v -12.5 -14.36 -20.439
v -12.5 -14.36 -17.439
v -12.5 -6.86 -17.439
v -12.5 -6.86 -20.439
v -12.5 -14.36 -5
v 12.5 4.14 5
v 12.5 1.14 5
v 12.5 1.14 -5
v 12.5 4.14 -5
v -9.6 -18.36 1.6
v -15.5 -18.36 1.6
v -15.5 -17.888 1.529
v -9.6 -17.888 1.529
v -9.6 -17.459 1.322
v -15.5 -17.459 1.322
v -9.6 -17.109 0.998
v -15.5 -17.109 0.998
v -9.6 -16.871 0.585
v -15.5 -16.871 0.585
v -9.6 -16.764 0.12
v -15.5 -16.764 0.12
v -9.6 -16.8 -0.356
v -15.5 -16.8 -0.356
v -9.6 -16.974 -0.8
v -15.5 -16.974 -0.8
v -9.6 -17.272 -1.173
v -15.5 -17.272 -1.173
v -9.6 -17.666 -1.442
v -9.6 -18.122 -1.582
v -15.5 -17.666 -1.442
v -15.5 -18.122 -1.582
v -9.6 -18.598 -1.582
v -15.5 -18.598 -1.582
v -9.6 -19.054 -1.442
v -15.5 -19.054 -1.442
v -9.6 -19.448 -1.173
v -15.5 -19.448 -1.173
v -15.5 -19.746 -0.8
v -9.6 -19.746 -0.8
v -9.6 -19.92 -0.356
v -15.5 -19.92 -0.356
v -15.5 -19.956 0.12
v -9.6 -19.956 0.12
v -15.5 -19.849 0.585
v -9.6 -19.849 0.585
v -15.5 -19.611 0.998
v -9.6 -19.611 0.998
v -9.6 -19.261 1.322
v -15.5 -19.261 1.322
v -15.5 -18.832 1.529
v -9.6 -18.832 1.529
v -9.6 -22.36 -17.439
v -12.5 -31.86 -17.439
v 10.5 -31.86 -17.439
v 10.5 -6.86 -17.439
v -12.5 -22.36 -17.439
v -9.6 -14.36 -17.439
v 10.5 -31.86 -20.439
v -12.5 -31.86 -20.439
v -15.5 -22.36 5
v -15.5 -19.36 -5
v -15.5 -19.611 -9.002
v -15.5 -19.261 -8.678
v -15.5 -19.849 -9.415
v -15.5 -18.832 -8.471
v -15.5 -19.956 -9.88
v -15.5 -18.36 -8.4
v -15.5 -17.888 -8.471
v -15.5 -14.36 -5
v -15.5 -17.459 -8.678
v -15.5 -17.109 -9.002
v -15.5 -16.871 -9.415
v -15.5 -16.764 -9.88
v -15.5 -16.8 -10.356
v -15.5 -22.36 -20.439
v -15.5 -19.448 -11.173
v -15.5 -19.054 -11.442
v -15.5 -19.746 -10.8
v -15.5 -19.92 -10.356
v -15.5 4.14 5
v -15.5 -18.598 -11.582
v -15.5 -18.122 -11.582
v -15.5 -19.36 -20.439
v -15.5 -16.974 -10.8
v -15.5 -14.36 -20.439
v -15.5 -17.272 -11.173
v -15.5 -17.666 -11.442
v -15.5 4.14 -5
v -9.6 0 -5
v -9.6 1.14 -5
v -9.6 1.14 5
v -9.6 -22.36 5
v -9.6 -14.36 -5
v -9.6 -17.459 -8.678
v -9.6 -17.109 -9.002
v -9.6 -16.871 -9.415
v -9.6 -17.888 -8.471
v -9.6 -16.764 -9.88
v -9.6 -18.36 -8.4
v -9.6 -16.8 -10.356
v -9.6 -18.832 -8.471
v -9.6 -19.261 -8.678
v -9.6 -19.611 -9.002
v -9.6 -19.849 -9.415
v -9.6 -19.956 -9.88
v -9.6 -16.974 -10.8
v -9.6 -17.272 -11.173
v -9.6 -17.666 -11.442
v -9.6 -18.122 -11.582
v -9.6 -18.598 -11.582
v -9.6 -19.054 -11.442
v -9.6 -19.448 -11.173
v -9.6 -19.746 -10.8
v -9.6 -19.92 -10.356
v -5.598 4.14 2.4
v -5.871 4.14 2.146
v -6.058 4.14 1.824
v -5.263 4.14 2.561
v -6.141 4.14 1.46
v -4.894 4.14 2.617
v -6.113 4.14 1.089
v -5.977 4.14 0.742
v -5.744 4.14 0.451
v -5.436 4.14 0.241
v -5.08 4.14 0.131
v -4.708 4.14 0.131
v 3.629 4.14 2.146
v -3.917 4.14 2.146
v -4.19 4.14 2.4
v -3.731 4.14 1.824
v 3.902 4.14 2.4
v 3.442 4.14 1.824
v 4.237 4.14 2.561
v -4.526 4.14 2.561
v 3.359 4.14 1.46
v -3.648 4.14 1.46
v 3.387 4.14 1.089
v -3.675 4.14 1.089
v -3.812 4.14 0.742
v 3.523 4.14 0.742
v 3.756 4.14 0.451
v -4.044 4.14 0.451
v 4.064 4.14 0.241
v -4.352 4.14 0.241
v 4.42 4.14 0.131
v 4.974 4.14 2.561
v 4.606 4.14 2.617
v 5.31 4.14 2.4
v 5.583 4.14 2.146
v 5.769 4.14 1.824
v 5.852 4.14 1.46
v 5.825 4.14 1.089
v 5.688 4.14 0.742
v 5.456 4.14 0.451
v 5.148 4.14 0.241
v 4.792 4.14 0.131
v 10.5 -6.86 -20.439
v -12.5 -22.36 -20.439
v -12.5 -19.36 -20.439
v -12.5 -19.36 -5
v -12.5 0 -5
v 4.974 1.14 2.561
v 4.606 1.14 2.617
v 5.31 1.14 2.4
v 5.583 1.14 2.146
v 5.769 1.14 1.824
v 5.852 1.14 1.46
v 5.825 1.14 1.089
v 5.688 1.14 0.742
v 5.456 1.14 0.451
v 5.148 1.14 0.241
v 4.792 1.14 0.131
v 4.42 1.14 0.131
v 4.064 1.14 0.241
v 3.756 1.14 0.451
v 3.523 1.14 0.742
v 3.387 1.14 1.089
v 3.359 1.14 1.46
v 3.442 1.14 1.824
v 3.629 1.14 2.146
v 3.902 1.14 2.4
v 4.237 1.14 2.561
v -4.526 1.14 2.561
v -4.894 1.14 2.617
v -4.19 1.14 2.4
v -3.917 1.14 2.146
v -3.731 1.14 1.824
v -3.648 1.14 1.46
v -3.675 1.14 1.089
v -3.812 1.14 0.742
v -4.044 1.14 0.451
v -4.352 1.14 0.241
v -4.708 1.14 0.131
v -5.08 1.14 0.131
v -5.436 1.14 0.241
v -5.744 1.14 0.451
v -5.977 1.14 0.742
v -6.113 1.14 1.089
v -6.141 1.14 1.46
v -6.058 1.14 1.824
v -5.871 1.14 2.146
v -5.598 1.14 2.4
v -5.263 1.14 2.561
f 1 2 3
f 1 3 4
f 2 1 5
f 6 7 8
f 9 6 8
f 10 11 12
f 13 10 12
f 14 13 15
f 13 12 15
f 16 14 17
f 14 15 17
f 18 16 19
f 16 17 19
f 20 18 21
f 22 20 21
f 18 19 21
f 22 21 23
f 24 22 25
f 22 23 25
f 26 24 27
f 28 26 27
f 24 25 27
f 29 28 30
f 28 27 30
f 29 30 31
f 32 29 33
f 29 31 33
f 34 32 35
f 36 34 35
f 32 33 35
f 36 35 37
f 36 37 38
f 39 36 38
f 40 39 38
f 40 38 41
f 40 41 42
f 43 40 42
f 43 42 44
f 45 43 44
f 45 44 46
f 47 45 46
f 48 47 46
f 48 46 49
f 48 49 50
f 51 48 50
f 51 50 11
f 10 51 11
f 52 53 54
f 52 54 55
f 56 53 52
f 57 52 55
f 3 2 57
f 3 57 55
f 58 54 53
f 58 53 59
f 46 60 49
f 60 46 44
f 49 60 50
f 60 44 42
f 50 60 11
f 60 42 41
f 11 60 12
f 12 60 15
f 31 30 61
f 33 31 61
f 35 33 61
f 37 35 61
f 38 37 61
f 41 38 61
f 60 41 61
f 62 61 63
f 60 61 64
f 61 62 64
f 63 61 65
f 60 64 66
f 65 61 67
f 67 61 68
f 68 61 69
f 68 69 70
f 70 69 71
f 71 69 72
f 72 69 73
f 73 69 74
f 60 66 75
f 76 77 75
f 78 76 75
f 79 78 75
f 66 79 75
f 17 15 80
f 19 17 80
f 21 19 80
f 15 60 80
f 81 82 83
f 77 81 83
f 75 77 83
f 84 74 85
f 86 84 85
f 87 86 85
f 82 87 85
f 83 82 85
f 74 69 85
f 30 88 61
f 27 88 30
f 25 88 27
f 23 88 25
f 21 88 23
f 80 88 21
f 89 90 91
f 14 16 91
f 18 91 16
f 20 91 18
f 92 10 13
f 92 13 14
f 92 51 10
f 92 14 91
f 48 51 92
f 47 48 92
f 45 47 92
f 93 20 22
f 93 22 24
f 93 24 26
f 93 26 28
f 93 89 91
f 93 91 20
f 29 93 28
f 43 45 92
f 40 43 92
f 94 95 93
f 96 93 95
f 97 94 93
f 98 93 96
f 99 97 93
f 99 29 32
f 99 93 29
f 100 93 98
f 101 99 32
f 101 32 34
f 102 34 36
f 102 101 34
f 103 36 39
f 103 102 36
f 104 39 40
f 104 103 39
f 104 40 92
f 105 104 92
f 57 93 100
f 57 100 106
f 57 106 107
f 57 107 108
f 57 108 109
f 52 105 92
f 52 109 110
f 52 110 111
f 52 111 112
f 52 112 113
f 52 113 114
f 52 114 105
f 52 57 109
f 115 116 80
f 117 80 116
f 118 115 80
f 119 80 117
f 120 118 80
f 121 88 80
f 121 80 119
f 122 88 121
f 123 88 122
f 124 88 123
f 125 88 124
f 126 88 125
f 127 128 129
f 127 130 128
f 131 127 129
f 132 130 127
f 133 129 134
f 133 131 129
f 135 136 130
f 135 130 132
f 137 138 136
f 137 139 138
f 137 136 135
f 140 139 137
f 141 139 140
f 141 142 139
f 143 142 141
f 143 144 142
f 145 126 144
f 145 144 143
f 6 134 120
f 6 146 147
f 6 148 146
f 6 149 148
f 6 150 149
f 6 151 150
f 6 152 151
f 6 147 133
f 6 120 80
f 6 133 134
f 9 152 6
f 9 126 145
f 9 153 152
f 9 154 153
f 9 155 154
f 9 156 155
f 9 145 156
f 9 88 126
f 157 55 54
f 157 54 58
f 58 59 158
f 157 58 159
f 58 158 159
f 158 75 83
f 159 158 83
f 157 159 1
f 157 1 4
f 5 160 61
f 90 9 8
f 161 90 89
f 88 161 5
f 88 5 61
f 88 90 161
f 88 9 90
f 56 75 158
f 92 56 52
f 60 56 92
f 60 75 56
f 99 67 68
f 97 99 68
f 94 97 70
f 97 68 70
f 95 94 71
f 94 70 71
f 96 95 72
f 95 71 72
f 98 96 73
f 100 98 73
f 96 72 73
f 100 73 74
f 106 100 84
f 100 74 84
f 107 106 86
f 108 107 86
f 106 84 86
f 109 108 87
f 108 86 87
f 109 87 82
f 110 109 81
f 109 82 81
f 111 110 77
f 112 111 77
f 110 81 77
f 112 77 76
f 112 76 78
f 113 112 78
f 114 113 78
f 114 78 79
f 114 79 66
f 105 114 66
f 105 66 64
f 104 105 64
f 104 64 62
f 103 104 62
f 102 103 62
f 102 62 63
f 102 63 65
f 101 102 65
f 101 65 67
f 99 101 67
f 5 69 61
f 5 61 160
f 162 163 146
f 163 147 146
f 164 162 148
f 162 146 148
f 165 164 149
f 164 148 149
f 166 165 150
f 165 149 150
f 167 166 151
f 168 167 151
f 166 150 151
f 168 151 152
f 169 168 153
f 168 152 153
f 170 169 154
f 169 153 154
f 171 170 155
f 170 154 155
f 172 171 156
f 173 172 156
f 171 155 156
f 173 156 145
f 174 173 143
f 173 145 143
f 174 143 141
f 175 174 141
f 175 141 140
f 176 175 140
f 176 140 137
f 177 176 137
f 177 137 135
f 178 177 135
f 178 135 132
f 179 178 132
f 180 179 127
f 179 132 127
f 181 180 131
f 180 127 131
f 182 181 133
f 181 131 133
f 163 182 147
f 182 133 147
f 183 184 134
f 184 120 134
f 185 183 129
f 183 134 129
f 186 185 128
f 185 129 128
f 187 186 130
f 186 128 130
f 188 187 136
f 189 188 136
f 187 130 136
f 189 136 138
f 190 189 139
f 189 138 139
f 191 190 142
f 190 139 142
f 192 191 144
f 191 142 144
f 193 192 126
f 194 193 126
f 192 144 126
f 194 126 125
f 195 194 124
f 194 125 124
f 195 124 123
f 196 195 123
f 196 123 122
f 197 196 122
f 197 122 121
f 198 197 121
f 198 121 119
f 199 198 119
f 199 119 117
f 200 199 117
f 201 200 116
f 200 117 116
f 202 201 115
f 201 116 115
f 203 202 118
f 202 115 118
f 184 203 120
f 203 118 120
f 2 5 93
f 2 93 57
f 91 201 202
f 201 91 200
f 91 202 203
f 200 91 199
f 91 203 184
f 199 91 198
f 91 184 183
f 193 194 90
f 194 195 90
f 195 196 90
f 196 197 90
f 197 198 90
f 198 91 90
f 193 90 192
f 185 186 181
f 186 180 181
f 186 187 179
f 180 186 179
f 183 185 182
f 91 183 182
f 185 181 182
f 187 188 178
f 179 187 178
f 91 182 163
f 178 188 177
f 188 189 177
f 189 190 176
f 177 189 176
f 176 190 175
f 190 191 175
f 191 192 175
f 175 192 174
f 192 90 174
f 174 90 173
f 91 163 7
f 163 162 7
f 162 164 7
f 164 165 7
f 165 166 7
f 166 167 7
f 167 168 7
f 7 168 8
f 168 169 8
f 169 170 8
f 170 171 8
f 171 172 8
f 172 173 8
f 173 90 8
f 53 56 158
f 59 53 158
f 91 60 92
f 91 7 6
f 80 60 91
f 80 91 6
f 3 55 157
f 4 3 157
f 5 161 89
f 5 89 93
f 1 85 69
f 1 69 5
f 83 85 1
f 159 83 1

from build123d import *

# Parameters (mm, degrees)
SKETCH1_W               = 25
SKETCH1_H               = 10
BOSS_EXTRUDE1_DEPTH     = 3
SKETCH2_R               = 1.25
CUT_EXTRUDE1_DEPTH      = 10
SKETCH3_W               = 10
SKETCH3_H               = 3
BOSS_EXTRUDE2_DEPTH     = 3
SKETCH4_W               = 3
SKETCH4_H               = 19.36
BOSS_EXTRUDE3_DEPTH     = 10
BOSS_EXTRUDE4_DEPTH     = 3
SKETCH6_W               = 3
SKETCH6_H               = 25
BOSS_EXTRUDE5_DEPTH     = 23
SKETCH7_W               = 3
SKETCH7_H               = 15.439035089
BOSS_EXTRUDE6_DEPTH     = 5
BOSS_EXTRUDE7_DEPTH     = 2.9
BOSS_EXTRUDE8_DEPTH     = 10
CUT_EXTRUDE2_DEPTH      = 10
CUT_EXTRUDE3_DEPTH      = 42.797000958
CUT_EXTRUDE3_DEPTH_BACK = 42.797000958
SKETCH11_R              = 1.25
SKETCH12_R              = 1.6
CUT_EXTRUDE4_DEPTH      = 40


with BuildPart() as part:
    # Sketch1 → Boss-Extrude1 (new body)
    with BuildSketch(Plane(origin=(0, 0, 0), x_dir=(1, 0, 0), z_dir=(0, 1, 0))):
        Rectangle(SKETCH1_W, SKETCH1_H)
    extrude(amount=BOSS_EXTRUDE1_DEPTH)

    # Sketch2 → Cut-Extrude1 (cut)
    with BuildSketch(Plane(origin=(0, 3, 0), x_dir=(1, 0, 0), z_dir=(0, 1, 0))):
        with Locations((-4.894136616, -1.366933975)):
            Circle(SKETCH2_R)
        with Locations((4.605863384, -1.366933975)):
            Circle(SKETCH2_R)
    extrude(amount=-CUT_EXTRUDE1_DEPTH, mode=Mode.SUBTRACT)

    # Sketch3 → Boss-Extrude2 (add)
    with BuildSketch(Plane.ZY.offset(12.5)):
        with Locations((0, 1.5)):
            Rectangle(SKETCH3_W, SKETCH3_H)
    extrude(amount=BOSS_EXTRUDE2_DEPTH)

    # Sketch4 → Boss-Extrude3 (add)
    with BuildSketch(Plane(origin=(0, 0, -5), x_dir=(-1, 0, 0), z_dir=(0, 0, -1))):
        with Locations((14, -9.68)):
            Rectangle(SKETCH4_W, SKETCH4_H)
    extrude(amount=-BOSS_EXTRUDE3_DEPTH)

    # Sketch5 → Boss-Extrude4 (add)
    with BuildSketch(Plane.ZY.offset(15.5)):
        Polygon((5, -19.36), (5, -22.36), (-17.439050417, -22.36), (-20.439050417, -22.36), (-20.439050417, -19.359965116), (-17.439050417, -19.359965116), align=None)
    extrude(amount=-BOSS_EXTRUDE4_DEPTH)

    # Sketch6 → Boss-Extrude5 (add)
    with BuildSketch(Plane(origin=(-12.5, 0, 0), x_dir=(0, 0, -1), z_dir=(1, 0, 0))):
        with Locations((18.939050417, -19.359753222)):
            Rectangle(SKETCH6_W, SKETCH6_H)
    extrude(amount=BOSS_EXTRUDE5_DEPTH)


with BuildPart() as boss_extrude6_tool:
    # Sketch7 → Boss-Extrude6 (new body)
    with BuildSketch(Plane(origin=(0, -19.359992227, -3.0098e-05), x_dir=(1, 0, 0), z_dir=(0, 0.9999999999987916, 1.5546330463646684e-06))):
        with Locations((-14, 12.719522209)):
            Rectangle(SKETCH7_W, SKETCH7_H)
    extrude(amount=BOSS_EXTRUDE6_DEPTH)


with BuildPart() as part_1:
    add(part.part)


with BuildPart() as part_2:
    # Boss-Extrude6: joined with boss_extrude6_tool
    add(part_1.part.fuse(boss_extrude6_tool.part, tol=0.00001))

    # Sketch8 → Boss-Extrude7 (add)
    with BuildSketch(Plane(origin=(-12.5, 0, 0), x_dir=(0, 0, -1), z_dir=(1, 0, 0))):
        Polygon((17.439050417, -22.36), (-5, -22.36), (-5, 0), (5, 0), (5.000026988, -14.359984454), (17.439050417, -14.359962784), align=None)
    extrude(amount=BOSS_EXTRUDE7_DEPTH)

    # Sketch9 → Boss-Extrude8 (add)
    with BuildSketch(Plane(origin=(0, 0, -5), x_dir=(-1, 0, 0), z_dir=(0, 0, -1))):
        Polygon((1, 1.140246778), (15.5, 1.140246778), (15.5, 4.140246778), (-12.5, 4.140246778), (-12.5, 1.140246778), align=None)
    extrude(amount=-BOSS_EXTRUDE8_DEPTH)

    # Sketch10 → Cut-Extrude2 (cut)
    with BuildSketch(Plane(origin=(0, 0, -5), x_dir=(-1, 0, 0), z_dir=(0, 0, -1))):
        Polygon((-10.464750731, 1.14), (9.6, 1.14), (9.6, 0), (-12.5, 0), (-12.5, 1.14), align=None)
    extrude(amount=-CUT_EXTRUDE2_DEPTH, mode=Mode.SUBTRACT)

    # Sketch11 → Cut-Extrude3 (cut, two sides: drawn at the far end of the back side and taken through both)
    with BuildSketch(Plane.XZ.offset(-1.14).offset(-CUT_EXTRUDE3_DEPTH_BACK)):
        with Locations((-4.894136616, 1.366933975)):
            Circle(SKETCH11_R)
        with Locations((4.605863384, 1.366933975)):
            Circle(SKETCH11_R)
    extrude(amount=CUT_EXTRUDE3_DEPTH + CUT_EXTRUDE3_DEPTH_BACK, mode=Mode.SUBTRACT)

    # Sketch12 → Cut-Extrude4 (cut)
    with BuildSketch(Plane.ZY.offset(15.5)):
        with Locations((-1.8211e-05, -18.359986331)):
            Circle(SKETCH12_R)
        with Locations((-10.000013494, -18.359992227)):
            Circle(SKETCH12_R)
    extrude(amount=-CUT_EXTRUDE4_DEPTH, mode=Mode.SUBTRACT)


solid = part_2.part
